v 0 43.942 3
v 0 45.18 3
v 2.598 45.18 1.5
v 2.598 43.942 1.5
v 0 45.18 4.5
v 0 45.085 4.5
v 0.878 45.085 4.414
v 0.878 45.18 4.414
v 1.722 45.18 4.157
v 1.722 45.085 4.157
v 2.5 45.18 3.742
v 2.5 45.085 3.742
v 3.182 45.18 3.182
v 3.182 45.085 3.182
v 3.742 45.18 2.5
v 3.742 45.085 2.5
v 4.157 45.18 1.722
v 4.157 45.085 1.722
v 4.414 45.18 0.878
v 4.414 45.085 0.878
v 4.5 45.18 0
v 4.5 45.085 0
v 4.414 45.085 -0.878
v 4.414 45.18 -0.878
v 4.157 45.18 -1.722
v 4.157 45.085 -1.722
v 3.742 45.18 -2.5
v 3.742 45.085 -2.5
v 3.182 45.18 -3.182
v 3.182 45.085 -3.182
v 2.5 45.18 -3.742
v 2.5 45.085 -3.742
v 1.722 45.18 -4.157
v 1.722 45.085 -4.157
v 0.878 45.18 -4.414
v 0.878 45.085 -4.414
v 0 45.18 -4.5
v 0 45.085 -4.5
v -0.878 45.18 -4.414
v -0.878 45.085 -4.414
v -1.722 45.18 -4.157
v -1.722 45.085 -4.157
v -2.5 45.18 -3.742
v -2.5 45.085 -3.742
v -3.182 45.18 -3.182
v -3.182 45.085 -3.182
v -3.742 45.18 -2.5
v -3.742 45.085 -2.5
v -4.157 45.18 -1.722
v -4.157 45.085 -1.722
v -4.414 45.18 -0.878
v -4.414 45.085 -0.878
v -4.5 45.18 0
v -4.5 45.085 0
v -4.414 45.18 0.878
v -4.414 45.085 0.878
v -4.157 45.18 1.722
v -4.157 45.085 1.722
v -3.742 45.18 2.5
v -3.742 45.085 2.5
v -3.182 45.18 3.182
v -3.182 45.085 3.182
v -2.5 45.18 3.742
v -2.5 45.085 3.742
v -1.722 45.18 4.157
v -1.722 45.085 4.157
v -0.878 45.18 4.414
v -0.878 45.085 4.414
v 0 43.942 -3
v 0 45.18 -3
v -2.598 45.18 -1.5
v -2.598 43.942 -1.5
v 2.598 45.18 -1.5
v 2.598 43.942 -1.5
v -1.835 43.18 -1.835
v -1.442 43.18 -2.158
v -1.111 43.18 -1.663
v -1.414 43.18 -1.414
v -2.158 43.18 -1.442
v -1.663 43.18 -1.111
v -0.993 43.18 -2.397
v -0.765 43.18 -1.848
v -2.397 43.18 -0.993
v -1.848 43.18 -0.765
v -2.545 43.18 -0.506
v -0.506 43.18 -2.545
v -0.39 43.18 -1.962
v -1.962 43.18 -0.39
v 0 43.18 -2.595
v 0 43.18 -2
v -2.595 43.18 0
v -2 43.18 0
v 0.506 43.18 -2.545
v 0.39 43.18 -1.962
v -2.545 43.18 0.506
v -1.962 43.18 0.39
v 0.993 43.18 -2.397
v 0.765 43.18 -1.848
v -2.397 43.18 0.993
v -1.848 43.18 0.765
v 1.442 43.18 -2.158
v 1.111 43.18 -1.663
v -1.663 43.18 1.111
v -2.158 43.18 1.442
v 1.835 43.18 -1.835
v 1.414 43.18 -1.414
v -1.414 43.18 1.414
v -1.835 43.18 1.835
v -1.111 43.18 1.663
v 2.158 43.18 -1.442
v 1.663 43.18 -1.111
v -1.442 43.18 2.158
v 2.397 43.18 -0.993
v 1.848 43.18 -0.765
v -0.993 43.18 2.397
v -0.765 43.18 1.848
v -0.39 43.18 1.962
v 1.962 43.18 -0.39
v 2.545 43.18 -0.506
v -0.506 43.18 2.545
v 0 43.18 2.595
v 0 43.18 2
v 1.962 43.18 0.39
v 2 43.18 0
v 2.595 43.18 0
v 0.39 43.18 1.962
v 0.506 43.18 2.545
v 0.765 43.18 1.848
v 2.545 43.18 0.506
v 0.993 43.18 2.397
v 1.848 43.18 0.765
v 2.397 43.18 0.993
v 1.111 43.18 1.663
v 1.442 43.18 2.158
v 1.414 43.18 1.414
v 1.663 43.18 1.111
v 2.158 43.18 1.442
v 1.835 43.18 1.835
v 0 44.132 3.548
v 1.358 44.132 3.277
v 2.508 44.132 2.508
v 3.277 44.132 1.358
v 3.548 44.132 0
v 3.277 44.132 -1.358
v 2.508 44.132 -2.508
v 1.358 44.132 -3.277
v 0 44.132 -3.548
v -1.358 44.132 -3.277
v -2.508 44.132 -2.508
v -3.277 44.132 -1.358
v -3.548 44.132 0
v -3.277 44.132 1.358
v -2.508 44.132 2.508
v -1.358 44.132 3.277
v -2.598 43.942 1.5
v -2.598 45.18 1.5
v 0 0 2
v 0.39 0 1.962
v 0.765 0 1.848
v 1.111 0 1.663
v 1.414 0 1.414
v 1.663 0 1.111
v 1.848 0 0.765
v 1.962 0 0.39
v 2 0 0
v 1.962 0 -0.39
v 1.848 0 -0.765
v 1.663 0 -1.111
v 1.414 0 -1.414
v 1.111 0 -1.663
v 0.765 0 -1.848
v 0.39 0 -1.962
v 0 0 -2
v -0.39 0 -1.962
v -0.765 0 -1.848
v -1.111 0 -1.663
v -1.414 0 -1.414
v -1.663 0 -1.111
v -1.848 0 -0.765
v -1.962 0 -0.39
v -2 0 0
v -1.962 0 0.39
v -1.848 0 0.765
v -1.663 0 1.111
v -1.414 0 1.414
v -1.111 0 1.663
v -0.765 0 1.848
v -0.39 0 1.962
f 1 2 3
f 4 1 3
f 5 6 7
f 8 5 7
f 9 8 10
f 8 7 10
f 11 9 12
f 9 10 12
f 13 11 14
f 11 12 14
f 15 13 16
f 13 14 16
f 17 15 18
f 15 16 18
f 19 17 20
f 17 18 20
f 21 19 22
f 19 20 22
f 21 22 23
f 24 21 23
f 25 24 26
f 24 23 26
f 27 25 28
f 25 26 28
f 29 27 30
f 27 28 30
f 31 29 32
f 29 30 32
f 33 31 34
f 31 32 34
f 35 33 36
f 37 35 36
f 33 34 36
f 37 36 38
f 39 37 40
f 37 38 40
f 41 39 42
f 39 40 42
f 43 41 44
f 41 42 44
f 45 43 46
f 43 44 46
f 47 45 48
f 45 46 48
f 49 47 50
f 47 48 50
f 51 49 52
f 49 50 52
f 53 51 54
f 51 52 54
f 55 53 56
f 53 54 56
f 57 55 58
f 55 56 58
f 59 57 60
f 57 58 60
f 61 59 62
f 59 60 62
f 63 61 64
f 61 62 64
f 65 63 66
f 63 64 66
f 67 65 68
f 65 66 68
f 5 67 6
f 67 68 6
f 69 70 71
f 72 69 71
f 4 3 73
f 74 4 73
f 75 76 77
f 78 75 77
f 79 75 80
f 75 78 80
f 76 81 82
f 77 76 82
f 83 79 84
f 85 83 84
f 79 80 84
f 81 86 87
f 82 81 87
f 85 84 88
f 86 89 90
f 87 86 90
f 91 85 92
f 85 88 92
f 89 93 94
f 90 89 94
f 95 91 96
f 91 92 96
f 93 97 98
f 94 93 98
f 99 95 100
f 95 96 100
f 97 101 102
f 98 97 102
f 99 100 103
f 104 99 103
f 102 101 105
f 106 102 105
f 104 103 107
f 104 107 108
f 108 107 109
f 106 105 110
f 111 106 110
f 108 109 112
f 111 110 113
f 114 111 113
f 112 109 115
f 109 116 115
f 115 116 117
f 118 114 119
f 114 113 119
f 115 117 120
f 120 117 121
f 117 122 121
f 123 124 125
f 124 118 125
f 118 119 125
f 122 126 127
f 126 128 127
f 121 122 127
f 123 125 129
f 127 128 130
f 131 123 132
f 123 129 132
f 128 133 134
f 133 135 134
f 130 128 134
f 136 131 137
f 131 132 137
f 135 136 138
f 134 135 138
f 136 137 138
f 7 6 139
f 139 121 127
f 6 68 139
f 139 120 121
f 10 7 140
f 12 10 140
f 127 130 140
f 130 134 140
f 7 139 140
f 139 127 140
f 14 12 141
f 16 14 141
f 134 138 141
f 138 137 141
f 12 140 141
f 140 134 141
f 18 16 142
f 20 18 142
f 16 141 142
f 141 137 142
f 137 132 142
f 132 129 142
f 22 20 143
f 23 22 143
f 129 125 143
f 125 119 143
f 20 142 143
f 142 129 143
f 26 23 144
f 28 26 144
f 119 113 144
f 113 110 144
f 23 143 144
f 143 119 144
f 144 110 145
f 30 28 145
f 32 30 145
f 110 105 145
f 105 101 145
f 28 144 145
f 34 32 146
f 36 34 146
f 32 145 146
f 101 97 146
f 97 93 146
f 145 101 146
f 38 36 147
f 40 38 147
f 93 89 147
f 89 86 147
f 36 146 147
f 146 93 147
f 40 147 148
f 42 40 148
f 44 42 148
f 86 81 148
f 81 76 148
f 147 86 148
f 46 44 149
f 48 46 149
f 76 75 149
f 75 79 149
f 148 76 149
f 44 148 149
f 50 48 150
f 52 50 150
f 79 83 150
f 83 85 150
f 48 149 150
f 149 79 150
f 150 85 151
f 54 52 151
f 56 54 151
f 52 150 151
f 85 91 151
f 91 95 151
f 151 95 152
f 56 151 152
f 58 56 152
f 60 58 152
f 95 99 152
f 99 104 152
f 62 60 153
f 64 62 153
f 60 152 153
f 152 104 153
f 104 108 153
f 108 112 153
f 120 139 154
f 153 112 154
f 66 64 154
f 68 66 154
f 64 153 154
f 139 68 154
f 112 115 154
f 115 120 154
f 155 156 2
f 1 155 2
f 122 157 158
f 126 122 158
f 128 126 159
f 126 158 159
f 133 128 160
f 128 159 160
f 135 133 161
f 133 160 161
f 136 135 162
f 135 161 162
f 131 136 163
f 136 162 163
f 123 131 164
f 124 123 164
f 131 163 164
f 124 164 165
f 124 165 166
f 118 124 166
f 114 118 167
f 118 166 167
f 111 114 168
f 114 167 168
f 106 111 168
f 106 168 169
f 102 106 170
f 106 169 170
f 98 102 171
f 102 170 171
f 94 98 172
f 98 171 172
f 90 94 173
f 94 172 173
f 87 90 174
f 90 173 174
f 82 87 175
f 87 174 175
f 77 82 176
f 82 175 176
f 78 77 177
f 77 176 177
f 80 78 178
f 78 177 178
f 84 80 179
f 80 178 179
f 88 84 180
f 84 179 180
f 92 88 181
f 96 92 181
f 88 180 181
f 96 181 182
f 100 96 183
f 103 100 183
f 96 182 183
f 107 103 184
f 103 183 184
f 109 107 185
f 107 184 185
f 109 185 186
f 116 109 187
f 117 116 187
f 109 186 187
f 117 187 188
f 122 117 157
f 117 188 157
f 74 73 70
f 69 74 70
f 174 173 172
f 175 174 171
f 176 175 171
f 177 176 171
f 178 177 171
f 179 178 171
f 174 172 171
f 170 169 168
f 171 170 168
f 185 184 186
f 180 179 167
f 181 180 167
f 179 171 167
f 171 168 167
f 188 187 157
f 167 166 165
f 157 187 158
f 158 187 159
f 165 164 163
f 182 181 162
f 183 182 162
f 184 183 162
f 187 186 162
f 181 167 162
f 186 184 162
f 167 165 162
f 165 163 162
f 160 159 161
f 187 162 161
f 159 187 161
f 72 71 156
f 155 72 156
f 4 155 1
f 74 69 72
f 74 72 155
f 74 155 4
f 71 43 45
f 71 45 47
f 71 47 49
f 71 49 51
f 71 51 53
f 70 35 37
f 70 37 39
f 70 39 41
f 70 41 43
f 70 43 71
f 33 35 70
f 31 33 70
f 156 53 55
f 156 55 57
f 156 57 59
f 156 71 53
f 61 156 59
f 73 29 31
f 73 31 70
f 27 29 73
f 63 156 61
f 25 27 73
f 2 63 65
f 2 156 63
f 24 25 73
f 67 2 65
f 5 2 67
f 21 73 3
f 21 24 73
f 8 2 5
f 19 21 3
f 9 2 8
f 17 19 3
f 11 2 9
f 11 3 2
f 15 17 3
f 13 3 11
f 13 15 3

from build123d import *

# Parameters (mm, degrees)
SKETCH1_R     = 2
LENGTH_DEPTH  = 43.18
SKETCH2_R     = 4.5
CAP_DEPTH     = 2
HEX_CUT_DEPTH = 1.238
CHAMFER1_SIZE = 1.905


with BuildPart() as part:
    # Sketch1 → Length (new body)
    with BuildSketch(Plane(origin=(0, 0, 0), x_dir=(1, 0, 0), z_dir=(0, 1, 0))):
        with Locations(Location((0, 0, 0), (0, 0, 270))):
            Circle(SKETCH1_R)
    extrude(amount=LENGTH_DEPTH)

    # Sketch2 → Cap (add)
    with BuildSketch(Plane(origin=(0, 43.18, 0), x_dir=(1, 0, 0), z_dir=(0, 1, 0))):
        with Locations(Location((0, 0, 0), (0, 0, 270))):
            Circle(SKETCH2_R)
    extrude(amount=CAP_DEPTH)

    # Sketch3 → Hex cut (cut)
    with BuildSketch(Plane(origin=(0, 45.18, 0), x_dir=(1, 0, 0), z_dir=(0, 1, 0))):
        Polygon((0, 3), (-2.598076211, 1.5), (-2.598076211, -1.5), (0, -3), (2.598076211, -1.5), (2.598076211, 1.5), align=None)
    extrude(amount=-HEX_CUT_DEPTH, mode=Mode.SUBTRACT)

    # Chamfer1
    chamfer1_edges = [part.edges().sort_by_distance(p)[0] for p in [
        (0, 43.18, -4.5),
    ]]
    chamfer(chamfer1_edges, length=CHAMFER1_SIZE)


solid = part.part
